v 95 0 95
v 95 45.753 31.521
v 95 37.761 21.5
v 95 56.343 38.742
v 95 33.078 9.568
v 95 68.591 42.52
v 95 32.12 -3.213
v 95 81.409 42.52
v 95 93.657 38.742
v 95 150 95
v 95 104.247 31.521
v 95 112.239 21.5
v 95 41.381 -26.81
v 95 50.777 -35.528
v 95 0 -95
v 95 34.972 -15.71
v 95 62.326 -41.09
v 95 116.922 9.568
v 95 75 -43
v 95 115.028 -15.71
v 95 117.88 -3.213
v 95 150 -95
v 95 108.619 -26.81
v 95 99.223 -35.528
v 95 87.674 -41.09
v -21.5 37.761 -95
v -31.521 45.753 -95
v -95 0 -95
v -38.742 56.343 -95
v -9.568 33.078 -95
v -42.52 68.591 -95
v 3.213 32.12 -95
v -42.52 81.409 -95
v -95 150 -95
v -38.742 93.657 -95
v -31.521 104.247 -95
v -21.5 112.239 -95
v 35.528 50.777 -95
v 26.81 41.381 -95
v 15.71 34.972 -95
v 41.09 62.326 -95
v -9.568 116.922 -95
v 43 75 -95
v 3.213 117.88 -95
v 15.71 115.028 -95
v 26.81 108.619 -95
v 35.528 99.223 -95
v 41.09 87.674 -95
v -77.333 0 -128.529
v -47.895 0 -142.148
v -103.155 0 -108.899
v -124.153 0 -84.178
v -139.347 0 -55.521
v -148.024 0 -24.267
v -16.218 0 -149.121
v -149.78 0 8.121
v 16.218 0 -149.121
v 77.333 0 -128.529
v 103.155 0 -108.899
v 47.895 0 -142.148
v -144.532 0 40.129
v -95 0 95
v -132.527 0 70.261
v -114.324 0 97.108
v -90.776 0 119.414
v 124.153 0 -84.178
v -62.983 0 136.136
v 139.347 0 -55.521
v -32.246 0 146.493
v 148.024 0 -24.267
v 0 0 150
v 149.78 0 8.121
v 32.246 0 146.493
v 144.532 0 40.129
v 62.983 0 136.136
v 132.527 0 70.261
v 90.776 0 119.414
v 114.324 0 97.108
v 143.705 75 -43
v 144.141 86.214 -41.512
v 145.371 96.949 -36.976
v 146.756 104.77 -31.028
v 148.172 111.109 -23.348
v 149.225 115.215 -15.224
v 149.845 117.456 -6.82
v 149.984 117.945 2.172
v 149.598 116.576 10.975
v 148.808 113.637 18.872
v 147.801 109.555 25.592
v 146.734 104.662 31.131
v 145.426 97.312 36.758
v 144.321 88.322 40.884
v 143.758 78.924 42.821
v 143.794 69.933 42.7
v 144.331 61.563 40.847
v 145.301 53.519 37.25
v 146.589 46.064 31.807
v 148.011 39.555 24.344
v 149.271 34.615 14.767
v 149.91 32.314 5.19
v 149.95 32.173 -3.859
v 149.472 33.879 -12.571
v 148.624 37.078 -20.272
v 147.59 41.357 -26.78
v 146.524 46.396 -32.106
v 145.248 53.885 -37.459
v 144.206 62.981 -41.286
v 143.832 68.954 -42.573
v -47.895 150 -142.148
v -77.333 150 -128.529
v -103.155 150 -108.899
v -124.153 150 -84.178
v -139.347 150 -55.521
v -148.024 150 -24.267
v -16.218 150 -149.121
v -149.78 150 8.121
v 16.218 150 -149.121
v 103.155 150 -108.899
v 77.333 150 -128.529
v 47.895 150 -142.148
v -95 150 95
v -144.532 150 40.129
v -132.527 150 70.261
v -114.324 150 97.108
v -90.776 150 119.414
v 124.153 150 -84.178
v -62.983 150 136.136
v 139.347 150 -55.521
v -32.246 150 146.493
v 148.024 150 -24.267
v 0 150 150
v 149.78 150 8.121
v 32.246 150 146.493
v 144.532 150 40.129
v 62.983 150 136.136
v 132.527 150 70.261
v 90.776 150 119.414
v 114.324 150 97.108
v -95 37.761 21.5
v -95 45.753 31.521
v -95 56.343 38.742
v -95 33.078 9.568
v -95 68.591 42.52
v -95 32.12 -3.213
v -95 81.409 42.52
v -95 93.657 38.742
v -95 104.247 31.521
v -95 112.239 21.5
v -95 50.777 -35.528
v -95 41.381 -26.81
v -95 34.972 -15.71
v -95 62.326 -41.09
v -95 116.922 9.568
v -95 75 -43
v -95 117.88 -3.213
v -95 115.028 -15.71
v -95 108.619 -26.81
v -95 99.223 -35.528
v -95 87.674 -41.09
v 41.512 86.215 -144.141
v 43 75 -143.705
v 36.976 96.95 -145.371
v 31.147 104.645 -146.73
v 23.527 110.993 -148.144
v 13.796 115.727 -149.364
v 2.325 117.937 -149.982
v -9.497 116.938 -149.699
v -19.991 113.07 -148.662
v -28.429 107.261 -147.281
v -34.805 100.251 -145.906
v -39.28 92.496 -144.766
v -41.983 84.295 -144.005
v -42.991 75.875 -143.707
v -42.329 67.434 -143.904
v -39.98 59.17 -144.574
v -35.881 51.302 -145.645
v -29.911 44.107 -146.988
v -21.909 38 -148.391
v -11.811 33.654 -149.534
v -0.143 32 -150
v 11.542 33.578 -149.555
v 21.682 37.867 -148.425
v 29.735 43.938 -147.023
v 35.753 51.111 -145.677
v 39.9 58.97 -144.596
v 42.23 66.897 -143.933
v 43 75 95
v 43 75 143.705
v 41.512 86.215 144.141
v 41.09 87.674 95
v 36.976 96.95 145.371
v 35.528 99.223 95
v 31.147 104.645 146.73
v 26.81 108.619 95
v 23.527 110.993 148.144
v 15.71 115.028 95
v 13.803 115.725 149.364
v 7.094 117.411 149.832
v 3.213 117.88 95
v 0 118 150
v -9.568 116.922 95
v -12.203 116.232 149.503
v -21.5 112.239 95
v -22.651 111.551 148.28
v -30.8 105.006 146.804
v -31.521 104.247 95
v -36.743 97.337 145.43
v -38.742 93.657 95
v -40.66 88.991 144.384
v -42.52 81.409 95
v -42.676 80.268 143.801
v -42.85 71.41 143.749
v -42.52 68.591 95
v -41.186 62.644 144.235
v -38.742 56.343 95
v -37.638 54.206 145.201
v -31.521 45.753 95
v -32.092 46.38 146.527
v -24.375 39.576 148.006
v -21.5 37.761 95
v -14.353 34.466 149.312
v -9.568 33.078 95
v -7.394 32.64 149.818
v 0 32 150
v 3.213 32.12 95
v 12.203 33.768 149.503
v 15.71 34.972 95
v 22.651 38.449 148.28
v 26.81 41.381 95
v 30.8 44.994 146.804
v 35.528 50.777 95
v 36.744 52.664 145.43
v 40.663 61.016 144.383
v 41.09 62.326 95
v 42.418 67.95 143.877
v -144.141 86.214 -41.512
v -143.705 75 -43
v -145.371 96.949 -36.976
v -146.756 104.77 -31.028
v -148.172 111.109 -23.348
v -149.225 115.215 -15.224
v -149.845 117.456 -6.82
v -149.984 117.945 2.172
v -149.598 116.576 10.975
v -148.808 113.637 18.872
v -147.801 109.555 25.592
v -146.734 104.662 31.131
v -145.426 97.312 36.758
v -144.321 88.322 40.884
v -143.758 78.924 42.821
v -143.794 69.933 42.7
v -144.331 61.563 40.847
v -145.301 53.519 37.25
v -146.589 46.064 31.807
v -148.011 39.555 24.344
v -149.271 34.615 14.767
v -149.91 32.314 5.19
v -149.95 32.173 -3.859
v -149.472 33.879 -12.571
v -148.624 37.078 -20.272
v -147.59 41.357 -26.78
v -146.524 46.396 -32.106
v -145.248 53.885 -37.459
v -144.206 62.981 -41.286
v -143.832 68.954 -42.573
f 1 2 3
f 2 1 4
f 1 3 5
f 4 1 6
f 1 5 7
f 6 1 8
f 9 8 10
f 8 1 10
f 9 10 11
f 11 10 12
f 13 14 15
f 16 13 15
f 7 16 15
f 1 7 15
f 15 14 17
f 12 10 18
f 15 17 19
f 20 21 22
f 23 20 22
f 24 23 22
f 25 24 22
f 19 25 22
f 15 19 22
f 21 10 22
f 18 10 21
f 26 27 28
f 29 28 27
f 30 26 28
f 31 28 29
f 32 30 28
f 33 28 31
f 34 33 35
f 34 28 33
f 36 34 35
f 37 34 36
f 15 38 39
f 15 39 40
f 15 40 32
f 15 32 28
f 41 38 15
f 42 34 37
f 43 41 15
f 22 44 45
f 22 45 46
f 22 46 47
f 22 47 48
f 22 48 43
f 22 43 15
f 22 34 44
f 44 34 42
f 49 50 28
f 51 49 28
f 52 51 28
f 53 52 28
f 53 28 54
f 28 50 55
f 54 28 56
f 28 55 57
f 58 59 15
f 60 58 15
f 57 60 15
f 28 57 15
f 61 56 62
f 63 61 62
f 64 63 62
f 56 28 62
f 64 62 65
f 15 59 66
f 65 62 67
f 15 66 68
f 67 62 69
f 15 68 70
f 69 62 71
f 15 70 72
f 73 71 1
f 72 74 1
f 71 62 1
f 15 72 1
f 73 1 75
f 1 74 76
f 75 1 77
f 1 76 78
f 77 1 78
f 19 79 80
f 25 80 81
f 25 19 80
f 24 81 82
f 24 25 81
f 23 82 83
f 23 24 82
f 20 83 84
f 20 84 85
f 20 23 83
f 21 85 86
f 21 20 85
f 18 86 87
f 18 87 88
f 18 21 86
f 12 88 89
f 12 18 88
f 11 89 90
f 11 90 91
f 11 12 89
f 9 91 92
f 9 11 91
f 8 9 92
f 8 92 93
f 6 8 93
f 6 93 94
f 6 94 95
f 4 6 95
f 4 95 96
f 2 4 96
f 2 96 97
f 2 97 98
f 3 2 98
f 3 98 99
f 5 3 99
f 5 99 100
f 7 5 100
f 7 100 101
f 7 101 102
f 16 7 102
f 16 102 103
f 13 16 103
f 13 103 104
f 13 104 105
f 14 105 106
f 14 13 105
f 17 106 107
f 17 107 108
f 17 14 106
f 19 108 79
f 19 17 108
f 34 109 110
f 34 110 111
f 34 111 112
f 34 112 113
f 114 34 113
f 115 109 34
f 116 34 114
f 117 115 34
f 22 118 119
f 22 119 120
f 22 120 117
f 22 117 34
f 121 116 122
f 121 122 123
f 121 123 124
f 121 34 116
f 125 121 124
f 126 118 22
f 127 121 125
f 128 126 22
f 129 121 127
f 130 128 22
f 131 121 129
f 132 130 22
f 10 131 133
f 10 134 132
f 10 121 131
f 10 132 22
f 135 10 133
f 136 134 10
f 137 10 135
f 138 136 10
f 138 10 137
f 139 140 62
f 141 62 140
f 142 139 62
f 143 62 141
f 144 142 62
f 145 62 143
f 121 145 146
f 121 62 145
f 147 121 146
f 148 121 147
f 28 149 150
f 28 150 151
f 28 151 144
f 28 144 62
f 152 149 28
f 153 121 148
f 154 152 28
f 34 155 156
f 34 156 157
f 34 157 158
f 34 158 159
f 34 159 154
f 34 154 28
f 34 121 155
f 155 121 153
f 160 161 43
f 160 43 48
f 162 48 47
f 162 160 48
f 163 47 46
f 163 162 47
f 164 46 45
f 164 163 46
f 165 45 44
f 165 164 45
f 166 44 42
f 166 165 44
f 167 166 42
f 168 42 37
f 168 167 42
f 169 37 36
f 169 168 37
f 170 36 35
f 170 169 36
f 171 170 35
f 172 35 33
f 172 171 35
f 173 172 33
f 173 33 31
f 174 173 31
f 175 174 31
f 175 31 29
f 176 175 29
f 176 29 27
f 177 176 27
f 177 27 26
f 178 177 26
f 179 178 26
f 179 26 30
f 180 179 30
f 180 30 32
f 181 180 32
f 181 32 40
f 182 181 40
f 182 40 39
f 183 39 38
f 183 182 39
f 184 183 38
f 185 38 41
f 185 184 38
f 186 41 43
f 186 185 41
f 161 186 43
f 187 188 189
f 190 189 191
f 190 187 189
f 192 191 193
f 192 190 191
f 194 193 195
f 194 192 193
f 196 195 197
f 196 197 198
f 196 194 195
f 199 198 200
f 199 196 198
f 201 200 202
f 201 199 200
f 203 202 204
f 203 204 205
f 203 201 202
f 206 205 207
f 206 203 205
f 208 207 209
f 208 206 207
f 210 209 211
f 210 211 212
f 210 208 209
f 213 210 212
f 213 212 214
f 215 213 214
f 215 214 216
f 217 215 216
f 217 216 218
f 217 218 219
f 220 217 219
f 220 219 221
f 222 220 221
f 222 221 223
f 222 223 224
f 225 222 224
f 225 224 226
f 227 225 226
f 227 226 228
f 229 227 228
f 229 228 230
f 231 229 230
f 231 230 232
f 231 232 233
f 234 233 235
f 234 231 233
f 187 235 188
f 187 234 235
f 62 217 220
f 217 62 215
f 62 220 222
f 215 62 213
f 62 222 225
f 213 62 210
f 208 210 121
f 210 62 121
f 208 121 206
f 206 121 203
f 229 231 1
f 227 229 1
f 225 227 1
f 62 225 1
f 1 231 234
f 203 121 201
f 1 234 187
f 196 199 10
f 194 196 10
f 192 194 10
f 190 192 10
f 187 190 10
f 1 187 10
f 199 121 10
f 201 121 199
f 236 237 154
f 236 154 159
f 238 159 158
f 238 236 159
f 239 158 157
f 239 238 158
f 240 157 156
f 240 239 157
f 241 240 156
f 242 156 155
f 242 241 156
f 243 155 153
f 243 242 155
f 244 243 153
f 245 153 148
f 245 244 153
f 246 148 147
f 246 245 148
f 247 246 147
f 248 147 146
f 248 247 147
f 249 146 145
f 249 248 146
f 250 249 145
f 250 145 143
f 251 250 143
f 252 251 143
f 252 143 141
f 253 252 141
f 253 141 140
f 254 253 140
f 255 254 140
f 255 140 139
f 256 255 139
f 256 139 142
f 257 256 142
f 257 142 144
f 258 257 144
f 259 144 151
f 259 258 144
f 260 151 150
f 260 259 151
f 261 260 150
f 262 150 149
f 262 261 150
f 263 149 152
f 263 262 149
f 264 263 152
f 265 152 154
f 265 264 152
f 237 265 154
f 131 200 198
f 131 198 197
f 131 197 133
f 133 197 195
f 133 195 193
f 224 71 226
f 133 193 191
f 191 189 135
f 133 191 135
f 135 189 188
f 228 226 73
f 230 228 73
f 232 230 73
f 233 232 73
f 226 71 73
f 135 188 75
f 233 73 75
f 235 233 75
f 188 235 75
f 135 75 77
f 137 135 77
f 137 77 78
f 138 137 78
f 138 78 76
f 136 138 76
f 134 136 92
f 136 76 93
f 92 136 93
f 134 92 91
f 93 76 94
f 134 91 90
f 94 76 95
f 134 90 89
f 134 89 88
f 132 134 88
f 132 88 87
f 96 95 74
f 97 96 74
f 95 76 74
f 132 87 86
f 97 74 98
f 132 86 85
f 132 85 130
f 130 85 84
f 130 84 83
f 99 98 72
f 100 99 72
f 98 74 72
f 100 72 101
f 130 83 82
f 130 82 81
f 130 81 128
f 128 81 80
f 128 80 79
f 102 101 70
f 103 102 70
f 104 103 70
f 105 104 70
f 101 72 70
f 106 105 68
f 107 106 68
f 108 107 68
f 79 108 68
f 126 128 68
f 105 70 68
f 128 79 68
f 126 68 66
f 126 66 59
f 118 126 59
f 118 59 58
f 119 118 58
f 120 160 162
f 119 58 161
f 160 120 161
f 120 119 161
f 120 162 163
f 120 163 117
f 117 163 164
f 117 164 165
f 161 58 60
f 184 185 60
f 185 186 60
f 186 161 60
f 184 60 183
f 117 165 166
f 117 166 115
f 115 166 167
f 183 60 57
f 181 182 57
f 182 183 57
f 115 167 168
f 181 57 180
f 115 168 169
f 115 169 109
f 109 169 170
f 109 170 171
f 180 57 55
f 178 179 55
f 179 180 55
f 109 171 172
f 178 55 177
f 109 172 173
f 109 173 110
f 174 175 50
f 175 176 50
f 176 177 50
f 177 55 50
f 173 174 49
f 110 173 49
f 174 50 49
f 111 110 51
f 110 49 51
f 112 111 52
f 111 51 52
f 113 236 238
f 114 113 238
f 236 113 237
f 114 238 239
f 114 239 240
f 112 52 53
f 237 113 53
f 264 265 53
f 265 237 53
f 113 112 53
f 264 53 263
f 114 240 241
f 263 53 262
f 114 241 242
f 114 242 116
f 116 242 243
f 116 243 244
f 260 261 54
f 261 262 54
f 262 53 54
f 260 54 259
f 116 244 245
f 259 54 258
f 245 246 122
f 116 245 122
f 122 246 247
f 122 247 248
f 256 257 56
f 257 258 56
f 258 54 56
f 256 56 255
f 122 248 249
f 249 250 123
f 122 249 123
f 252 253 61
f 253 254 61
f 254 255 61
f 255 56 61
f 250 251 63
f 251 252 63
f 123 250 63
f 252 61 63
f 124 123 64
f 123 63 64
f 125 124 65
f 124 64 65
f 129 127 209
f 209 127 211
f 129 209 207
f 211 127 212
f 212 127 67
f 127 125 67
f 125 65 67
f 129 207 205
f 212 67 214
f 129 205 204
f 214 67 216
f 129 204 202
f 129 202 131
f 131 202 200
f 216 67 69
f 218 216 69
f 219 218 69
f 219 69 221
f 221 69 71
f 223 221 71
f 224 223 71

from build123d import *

# Parameters (mm, degrees)
SKETCH1_R               = 150
BOSS_EXTRUDE1_DEPTH     = 150
SKETCH2_W               = 190
SKETCH2_H               = 190
CUT_EXTRUDE1_DEPTH      = 150
CUT_EXTRUDE2_DEPTH      = 260.807621135
CUT_EXTRUDE2_DEPTH_BACK = 260.807621135
SKETCH3_R               = 43
CUT_EXTRUDE3_DEPTH      = 260.807621309
CUT_EXTRUDE3_DEPTH_BACK = 260.807621309
SKETCH4_R               = 43


with BuildPart() as part:
    # Sketch1 → Boss-Extrude1 (new body)
    with BuildSketch(Plane(origin=(0, 0, 0), x_dir=(1, 0, 0), z_dir=(0, 1, 0))):
        with Locations(Location((0, 0, 0), (0, 0, 270))):
            Circle(SKETCH1_R)
    extrude(amount=BOSS_EXTRUDE1_DEPTH)

    # Sketch2 → Cut-Extrude1 (cut)
    with BuildSketch(Plane(origin=(0, 150, 0), x_dir=(1, 0, 0), z_dir=(0, 1, 0))):
        Rectangle(SKETCH2_W, SKETCH2_H)
    extrude(amount=-CUT_EXTRUDE1_DEPTH, mode=Mode.SUBTRACT)

    # Sketch3 → Cut-Extrude2 (cut, two sides: drawn at the far end of the back side and taken through both)
    with BuildSketch(Plane.XY.offset(-CUT_EXTRUDE2_DEPTH_BACK)):
        with Locations((0, 75)):
            Circle(SKETCH3_R)
    extrude(amount=CUT_EXTRUDE2_DEPTH + CUT_EXTRUDE2_DEPTH_BACK, mode=Mode.SUBTRACT)

    # Sketch4 → Cut-Extrude3 (cut, two sides: drawn at the far end of the back side and taken through both)
    with BuildSketch(Plane(origin=(0, 0, 0), x_dir=(0, 0, -1), z_dir=(1, 0, 0)).offset(-CUT_EXTRUDE3_DEPTH_BACK)):
        with Locations((0, 75)):
            Circle(SKETCH4_R)
    extrude(amount=CUT_EXTRUDE3_DEPTH + CUT_EXTRUDE3_DEPTH_BACK, mode=Mode.SUBTRACT)


solid = part.part
